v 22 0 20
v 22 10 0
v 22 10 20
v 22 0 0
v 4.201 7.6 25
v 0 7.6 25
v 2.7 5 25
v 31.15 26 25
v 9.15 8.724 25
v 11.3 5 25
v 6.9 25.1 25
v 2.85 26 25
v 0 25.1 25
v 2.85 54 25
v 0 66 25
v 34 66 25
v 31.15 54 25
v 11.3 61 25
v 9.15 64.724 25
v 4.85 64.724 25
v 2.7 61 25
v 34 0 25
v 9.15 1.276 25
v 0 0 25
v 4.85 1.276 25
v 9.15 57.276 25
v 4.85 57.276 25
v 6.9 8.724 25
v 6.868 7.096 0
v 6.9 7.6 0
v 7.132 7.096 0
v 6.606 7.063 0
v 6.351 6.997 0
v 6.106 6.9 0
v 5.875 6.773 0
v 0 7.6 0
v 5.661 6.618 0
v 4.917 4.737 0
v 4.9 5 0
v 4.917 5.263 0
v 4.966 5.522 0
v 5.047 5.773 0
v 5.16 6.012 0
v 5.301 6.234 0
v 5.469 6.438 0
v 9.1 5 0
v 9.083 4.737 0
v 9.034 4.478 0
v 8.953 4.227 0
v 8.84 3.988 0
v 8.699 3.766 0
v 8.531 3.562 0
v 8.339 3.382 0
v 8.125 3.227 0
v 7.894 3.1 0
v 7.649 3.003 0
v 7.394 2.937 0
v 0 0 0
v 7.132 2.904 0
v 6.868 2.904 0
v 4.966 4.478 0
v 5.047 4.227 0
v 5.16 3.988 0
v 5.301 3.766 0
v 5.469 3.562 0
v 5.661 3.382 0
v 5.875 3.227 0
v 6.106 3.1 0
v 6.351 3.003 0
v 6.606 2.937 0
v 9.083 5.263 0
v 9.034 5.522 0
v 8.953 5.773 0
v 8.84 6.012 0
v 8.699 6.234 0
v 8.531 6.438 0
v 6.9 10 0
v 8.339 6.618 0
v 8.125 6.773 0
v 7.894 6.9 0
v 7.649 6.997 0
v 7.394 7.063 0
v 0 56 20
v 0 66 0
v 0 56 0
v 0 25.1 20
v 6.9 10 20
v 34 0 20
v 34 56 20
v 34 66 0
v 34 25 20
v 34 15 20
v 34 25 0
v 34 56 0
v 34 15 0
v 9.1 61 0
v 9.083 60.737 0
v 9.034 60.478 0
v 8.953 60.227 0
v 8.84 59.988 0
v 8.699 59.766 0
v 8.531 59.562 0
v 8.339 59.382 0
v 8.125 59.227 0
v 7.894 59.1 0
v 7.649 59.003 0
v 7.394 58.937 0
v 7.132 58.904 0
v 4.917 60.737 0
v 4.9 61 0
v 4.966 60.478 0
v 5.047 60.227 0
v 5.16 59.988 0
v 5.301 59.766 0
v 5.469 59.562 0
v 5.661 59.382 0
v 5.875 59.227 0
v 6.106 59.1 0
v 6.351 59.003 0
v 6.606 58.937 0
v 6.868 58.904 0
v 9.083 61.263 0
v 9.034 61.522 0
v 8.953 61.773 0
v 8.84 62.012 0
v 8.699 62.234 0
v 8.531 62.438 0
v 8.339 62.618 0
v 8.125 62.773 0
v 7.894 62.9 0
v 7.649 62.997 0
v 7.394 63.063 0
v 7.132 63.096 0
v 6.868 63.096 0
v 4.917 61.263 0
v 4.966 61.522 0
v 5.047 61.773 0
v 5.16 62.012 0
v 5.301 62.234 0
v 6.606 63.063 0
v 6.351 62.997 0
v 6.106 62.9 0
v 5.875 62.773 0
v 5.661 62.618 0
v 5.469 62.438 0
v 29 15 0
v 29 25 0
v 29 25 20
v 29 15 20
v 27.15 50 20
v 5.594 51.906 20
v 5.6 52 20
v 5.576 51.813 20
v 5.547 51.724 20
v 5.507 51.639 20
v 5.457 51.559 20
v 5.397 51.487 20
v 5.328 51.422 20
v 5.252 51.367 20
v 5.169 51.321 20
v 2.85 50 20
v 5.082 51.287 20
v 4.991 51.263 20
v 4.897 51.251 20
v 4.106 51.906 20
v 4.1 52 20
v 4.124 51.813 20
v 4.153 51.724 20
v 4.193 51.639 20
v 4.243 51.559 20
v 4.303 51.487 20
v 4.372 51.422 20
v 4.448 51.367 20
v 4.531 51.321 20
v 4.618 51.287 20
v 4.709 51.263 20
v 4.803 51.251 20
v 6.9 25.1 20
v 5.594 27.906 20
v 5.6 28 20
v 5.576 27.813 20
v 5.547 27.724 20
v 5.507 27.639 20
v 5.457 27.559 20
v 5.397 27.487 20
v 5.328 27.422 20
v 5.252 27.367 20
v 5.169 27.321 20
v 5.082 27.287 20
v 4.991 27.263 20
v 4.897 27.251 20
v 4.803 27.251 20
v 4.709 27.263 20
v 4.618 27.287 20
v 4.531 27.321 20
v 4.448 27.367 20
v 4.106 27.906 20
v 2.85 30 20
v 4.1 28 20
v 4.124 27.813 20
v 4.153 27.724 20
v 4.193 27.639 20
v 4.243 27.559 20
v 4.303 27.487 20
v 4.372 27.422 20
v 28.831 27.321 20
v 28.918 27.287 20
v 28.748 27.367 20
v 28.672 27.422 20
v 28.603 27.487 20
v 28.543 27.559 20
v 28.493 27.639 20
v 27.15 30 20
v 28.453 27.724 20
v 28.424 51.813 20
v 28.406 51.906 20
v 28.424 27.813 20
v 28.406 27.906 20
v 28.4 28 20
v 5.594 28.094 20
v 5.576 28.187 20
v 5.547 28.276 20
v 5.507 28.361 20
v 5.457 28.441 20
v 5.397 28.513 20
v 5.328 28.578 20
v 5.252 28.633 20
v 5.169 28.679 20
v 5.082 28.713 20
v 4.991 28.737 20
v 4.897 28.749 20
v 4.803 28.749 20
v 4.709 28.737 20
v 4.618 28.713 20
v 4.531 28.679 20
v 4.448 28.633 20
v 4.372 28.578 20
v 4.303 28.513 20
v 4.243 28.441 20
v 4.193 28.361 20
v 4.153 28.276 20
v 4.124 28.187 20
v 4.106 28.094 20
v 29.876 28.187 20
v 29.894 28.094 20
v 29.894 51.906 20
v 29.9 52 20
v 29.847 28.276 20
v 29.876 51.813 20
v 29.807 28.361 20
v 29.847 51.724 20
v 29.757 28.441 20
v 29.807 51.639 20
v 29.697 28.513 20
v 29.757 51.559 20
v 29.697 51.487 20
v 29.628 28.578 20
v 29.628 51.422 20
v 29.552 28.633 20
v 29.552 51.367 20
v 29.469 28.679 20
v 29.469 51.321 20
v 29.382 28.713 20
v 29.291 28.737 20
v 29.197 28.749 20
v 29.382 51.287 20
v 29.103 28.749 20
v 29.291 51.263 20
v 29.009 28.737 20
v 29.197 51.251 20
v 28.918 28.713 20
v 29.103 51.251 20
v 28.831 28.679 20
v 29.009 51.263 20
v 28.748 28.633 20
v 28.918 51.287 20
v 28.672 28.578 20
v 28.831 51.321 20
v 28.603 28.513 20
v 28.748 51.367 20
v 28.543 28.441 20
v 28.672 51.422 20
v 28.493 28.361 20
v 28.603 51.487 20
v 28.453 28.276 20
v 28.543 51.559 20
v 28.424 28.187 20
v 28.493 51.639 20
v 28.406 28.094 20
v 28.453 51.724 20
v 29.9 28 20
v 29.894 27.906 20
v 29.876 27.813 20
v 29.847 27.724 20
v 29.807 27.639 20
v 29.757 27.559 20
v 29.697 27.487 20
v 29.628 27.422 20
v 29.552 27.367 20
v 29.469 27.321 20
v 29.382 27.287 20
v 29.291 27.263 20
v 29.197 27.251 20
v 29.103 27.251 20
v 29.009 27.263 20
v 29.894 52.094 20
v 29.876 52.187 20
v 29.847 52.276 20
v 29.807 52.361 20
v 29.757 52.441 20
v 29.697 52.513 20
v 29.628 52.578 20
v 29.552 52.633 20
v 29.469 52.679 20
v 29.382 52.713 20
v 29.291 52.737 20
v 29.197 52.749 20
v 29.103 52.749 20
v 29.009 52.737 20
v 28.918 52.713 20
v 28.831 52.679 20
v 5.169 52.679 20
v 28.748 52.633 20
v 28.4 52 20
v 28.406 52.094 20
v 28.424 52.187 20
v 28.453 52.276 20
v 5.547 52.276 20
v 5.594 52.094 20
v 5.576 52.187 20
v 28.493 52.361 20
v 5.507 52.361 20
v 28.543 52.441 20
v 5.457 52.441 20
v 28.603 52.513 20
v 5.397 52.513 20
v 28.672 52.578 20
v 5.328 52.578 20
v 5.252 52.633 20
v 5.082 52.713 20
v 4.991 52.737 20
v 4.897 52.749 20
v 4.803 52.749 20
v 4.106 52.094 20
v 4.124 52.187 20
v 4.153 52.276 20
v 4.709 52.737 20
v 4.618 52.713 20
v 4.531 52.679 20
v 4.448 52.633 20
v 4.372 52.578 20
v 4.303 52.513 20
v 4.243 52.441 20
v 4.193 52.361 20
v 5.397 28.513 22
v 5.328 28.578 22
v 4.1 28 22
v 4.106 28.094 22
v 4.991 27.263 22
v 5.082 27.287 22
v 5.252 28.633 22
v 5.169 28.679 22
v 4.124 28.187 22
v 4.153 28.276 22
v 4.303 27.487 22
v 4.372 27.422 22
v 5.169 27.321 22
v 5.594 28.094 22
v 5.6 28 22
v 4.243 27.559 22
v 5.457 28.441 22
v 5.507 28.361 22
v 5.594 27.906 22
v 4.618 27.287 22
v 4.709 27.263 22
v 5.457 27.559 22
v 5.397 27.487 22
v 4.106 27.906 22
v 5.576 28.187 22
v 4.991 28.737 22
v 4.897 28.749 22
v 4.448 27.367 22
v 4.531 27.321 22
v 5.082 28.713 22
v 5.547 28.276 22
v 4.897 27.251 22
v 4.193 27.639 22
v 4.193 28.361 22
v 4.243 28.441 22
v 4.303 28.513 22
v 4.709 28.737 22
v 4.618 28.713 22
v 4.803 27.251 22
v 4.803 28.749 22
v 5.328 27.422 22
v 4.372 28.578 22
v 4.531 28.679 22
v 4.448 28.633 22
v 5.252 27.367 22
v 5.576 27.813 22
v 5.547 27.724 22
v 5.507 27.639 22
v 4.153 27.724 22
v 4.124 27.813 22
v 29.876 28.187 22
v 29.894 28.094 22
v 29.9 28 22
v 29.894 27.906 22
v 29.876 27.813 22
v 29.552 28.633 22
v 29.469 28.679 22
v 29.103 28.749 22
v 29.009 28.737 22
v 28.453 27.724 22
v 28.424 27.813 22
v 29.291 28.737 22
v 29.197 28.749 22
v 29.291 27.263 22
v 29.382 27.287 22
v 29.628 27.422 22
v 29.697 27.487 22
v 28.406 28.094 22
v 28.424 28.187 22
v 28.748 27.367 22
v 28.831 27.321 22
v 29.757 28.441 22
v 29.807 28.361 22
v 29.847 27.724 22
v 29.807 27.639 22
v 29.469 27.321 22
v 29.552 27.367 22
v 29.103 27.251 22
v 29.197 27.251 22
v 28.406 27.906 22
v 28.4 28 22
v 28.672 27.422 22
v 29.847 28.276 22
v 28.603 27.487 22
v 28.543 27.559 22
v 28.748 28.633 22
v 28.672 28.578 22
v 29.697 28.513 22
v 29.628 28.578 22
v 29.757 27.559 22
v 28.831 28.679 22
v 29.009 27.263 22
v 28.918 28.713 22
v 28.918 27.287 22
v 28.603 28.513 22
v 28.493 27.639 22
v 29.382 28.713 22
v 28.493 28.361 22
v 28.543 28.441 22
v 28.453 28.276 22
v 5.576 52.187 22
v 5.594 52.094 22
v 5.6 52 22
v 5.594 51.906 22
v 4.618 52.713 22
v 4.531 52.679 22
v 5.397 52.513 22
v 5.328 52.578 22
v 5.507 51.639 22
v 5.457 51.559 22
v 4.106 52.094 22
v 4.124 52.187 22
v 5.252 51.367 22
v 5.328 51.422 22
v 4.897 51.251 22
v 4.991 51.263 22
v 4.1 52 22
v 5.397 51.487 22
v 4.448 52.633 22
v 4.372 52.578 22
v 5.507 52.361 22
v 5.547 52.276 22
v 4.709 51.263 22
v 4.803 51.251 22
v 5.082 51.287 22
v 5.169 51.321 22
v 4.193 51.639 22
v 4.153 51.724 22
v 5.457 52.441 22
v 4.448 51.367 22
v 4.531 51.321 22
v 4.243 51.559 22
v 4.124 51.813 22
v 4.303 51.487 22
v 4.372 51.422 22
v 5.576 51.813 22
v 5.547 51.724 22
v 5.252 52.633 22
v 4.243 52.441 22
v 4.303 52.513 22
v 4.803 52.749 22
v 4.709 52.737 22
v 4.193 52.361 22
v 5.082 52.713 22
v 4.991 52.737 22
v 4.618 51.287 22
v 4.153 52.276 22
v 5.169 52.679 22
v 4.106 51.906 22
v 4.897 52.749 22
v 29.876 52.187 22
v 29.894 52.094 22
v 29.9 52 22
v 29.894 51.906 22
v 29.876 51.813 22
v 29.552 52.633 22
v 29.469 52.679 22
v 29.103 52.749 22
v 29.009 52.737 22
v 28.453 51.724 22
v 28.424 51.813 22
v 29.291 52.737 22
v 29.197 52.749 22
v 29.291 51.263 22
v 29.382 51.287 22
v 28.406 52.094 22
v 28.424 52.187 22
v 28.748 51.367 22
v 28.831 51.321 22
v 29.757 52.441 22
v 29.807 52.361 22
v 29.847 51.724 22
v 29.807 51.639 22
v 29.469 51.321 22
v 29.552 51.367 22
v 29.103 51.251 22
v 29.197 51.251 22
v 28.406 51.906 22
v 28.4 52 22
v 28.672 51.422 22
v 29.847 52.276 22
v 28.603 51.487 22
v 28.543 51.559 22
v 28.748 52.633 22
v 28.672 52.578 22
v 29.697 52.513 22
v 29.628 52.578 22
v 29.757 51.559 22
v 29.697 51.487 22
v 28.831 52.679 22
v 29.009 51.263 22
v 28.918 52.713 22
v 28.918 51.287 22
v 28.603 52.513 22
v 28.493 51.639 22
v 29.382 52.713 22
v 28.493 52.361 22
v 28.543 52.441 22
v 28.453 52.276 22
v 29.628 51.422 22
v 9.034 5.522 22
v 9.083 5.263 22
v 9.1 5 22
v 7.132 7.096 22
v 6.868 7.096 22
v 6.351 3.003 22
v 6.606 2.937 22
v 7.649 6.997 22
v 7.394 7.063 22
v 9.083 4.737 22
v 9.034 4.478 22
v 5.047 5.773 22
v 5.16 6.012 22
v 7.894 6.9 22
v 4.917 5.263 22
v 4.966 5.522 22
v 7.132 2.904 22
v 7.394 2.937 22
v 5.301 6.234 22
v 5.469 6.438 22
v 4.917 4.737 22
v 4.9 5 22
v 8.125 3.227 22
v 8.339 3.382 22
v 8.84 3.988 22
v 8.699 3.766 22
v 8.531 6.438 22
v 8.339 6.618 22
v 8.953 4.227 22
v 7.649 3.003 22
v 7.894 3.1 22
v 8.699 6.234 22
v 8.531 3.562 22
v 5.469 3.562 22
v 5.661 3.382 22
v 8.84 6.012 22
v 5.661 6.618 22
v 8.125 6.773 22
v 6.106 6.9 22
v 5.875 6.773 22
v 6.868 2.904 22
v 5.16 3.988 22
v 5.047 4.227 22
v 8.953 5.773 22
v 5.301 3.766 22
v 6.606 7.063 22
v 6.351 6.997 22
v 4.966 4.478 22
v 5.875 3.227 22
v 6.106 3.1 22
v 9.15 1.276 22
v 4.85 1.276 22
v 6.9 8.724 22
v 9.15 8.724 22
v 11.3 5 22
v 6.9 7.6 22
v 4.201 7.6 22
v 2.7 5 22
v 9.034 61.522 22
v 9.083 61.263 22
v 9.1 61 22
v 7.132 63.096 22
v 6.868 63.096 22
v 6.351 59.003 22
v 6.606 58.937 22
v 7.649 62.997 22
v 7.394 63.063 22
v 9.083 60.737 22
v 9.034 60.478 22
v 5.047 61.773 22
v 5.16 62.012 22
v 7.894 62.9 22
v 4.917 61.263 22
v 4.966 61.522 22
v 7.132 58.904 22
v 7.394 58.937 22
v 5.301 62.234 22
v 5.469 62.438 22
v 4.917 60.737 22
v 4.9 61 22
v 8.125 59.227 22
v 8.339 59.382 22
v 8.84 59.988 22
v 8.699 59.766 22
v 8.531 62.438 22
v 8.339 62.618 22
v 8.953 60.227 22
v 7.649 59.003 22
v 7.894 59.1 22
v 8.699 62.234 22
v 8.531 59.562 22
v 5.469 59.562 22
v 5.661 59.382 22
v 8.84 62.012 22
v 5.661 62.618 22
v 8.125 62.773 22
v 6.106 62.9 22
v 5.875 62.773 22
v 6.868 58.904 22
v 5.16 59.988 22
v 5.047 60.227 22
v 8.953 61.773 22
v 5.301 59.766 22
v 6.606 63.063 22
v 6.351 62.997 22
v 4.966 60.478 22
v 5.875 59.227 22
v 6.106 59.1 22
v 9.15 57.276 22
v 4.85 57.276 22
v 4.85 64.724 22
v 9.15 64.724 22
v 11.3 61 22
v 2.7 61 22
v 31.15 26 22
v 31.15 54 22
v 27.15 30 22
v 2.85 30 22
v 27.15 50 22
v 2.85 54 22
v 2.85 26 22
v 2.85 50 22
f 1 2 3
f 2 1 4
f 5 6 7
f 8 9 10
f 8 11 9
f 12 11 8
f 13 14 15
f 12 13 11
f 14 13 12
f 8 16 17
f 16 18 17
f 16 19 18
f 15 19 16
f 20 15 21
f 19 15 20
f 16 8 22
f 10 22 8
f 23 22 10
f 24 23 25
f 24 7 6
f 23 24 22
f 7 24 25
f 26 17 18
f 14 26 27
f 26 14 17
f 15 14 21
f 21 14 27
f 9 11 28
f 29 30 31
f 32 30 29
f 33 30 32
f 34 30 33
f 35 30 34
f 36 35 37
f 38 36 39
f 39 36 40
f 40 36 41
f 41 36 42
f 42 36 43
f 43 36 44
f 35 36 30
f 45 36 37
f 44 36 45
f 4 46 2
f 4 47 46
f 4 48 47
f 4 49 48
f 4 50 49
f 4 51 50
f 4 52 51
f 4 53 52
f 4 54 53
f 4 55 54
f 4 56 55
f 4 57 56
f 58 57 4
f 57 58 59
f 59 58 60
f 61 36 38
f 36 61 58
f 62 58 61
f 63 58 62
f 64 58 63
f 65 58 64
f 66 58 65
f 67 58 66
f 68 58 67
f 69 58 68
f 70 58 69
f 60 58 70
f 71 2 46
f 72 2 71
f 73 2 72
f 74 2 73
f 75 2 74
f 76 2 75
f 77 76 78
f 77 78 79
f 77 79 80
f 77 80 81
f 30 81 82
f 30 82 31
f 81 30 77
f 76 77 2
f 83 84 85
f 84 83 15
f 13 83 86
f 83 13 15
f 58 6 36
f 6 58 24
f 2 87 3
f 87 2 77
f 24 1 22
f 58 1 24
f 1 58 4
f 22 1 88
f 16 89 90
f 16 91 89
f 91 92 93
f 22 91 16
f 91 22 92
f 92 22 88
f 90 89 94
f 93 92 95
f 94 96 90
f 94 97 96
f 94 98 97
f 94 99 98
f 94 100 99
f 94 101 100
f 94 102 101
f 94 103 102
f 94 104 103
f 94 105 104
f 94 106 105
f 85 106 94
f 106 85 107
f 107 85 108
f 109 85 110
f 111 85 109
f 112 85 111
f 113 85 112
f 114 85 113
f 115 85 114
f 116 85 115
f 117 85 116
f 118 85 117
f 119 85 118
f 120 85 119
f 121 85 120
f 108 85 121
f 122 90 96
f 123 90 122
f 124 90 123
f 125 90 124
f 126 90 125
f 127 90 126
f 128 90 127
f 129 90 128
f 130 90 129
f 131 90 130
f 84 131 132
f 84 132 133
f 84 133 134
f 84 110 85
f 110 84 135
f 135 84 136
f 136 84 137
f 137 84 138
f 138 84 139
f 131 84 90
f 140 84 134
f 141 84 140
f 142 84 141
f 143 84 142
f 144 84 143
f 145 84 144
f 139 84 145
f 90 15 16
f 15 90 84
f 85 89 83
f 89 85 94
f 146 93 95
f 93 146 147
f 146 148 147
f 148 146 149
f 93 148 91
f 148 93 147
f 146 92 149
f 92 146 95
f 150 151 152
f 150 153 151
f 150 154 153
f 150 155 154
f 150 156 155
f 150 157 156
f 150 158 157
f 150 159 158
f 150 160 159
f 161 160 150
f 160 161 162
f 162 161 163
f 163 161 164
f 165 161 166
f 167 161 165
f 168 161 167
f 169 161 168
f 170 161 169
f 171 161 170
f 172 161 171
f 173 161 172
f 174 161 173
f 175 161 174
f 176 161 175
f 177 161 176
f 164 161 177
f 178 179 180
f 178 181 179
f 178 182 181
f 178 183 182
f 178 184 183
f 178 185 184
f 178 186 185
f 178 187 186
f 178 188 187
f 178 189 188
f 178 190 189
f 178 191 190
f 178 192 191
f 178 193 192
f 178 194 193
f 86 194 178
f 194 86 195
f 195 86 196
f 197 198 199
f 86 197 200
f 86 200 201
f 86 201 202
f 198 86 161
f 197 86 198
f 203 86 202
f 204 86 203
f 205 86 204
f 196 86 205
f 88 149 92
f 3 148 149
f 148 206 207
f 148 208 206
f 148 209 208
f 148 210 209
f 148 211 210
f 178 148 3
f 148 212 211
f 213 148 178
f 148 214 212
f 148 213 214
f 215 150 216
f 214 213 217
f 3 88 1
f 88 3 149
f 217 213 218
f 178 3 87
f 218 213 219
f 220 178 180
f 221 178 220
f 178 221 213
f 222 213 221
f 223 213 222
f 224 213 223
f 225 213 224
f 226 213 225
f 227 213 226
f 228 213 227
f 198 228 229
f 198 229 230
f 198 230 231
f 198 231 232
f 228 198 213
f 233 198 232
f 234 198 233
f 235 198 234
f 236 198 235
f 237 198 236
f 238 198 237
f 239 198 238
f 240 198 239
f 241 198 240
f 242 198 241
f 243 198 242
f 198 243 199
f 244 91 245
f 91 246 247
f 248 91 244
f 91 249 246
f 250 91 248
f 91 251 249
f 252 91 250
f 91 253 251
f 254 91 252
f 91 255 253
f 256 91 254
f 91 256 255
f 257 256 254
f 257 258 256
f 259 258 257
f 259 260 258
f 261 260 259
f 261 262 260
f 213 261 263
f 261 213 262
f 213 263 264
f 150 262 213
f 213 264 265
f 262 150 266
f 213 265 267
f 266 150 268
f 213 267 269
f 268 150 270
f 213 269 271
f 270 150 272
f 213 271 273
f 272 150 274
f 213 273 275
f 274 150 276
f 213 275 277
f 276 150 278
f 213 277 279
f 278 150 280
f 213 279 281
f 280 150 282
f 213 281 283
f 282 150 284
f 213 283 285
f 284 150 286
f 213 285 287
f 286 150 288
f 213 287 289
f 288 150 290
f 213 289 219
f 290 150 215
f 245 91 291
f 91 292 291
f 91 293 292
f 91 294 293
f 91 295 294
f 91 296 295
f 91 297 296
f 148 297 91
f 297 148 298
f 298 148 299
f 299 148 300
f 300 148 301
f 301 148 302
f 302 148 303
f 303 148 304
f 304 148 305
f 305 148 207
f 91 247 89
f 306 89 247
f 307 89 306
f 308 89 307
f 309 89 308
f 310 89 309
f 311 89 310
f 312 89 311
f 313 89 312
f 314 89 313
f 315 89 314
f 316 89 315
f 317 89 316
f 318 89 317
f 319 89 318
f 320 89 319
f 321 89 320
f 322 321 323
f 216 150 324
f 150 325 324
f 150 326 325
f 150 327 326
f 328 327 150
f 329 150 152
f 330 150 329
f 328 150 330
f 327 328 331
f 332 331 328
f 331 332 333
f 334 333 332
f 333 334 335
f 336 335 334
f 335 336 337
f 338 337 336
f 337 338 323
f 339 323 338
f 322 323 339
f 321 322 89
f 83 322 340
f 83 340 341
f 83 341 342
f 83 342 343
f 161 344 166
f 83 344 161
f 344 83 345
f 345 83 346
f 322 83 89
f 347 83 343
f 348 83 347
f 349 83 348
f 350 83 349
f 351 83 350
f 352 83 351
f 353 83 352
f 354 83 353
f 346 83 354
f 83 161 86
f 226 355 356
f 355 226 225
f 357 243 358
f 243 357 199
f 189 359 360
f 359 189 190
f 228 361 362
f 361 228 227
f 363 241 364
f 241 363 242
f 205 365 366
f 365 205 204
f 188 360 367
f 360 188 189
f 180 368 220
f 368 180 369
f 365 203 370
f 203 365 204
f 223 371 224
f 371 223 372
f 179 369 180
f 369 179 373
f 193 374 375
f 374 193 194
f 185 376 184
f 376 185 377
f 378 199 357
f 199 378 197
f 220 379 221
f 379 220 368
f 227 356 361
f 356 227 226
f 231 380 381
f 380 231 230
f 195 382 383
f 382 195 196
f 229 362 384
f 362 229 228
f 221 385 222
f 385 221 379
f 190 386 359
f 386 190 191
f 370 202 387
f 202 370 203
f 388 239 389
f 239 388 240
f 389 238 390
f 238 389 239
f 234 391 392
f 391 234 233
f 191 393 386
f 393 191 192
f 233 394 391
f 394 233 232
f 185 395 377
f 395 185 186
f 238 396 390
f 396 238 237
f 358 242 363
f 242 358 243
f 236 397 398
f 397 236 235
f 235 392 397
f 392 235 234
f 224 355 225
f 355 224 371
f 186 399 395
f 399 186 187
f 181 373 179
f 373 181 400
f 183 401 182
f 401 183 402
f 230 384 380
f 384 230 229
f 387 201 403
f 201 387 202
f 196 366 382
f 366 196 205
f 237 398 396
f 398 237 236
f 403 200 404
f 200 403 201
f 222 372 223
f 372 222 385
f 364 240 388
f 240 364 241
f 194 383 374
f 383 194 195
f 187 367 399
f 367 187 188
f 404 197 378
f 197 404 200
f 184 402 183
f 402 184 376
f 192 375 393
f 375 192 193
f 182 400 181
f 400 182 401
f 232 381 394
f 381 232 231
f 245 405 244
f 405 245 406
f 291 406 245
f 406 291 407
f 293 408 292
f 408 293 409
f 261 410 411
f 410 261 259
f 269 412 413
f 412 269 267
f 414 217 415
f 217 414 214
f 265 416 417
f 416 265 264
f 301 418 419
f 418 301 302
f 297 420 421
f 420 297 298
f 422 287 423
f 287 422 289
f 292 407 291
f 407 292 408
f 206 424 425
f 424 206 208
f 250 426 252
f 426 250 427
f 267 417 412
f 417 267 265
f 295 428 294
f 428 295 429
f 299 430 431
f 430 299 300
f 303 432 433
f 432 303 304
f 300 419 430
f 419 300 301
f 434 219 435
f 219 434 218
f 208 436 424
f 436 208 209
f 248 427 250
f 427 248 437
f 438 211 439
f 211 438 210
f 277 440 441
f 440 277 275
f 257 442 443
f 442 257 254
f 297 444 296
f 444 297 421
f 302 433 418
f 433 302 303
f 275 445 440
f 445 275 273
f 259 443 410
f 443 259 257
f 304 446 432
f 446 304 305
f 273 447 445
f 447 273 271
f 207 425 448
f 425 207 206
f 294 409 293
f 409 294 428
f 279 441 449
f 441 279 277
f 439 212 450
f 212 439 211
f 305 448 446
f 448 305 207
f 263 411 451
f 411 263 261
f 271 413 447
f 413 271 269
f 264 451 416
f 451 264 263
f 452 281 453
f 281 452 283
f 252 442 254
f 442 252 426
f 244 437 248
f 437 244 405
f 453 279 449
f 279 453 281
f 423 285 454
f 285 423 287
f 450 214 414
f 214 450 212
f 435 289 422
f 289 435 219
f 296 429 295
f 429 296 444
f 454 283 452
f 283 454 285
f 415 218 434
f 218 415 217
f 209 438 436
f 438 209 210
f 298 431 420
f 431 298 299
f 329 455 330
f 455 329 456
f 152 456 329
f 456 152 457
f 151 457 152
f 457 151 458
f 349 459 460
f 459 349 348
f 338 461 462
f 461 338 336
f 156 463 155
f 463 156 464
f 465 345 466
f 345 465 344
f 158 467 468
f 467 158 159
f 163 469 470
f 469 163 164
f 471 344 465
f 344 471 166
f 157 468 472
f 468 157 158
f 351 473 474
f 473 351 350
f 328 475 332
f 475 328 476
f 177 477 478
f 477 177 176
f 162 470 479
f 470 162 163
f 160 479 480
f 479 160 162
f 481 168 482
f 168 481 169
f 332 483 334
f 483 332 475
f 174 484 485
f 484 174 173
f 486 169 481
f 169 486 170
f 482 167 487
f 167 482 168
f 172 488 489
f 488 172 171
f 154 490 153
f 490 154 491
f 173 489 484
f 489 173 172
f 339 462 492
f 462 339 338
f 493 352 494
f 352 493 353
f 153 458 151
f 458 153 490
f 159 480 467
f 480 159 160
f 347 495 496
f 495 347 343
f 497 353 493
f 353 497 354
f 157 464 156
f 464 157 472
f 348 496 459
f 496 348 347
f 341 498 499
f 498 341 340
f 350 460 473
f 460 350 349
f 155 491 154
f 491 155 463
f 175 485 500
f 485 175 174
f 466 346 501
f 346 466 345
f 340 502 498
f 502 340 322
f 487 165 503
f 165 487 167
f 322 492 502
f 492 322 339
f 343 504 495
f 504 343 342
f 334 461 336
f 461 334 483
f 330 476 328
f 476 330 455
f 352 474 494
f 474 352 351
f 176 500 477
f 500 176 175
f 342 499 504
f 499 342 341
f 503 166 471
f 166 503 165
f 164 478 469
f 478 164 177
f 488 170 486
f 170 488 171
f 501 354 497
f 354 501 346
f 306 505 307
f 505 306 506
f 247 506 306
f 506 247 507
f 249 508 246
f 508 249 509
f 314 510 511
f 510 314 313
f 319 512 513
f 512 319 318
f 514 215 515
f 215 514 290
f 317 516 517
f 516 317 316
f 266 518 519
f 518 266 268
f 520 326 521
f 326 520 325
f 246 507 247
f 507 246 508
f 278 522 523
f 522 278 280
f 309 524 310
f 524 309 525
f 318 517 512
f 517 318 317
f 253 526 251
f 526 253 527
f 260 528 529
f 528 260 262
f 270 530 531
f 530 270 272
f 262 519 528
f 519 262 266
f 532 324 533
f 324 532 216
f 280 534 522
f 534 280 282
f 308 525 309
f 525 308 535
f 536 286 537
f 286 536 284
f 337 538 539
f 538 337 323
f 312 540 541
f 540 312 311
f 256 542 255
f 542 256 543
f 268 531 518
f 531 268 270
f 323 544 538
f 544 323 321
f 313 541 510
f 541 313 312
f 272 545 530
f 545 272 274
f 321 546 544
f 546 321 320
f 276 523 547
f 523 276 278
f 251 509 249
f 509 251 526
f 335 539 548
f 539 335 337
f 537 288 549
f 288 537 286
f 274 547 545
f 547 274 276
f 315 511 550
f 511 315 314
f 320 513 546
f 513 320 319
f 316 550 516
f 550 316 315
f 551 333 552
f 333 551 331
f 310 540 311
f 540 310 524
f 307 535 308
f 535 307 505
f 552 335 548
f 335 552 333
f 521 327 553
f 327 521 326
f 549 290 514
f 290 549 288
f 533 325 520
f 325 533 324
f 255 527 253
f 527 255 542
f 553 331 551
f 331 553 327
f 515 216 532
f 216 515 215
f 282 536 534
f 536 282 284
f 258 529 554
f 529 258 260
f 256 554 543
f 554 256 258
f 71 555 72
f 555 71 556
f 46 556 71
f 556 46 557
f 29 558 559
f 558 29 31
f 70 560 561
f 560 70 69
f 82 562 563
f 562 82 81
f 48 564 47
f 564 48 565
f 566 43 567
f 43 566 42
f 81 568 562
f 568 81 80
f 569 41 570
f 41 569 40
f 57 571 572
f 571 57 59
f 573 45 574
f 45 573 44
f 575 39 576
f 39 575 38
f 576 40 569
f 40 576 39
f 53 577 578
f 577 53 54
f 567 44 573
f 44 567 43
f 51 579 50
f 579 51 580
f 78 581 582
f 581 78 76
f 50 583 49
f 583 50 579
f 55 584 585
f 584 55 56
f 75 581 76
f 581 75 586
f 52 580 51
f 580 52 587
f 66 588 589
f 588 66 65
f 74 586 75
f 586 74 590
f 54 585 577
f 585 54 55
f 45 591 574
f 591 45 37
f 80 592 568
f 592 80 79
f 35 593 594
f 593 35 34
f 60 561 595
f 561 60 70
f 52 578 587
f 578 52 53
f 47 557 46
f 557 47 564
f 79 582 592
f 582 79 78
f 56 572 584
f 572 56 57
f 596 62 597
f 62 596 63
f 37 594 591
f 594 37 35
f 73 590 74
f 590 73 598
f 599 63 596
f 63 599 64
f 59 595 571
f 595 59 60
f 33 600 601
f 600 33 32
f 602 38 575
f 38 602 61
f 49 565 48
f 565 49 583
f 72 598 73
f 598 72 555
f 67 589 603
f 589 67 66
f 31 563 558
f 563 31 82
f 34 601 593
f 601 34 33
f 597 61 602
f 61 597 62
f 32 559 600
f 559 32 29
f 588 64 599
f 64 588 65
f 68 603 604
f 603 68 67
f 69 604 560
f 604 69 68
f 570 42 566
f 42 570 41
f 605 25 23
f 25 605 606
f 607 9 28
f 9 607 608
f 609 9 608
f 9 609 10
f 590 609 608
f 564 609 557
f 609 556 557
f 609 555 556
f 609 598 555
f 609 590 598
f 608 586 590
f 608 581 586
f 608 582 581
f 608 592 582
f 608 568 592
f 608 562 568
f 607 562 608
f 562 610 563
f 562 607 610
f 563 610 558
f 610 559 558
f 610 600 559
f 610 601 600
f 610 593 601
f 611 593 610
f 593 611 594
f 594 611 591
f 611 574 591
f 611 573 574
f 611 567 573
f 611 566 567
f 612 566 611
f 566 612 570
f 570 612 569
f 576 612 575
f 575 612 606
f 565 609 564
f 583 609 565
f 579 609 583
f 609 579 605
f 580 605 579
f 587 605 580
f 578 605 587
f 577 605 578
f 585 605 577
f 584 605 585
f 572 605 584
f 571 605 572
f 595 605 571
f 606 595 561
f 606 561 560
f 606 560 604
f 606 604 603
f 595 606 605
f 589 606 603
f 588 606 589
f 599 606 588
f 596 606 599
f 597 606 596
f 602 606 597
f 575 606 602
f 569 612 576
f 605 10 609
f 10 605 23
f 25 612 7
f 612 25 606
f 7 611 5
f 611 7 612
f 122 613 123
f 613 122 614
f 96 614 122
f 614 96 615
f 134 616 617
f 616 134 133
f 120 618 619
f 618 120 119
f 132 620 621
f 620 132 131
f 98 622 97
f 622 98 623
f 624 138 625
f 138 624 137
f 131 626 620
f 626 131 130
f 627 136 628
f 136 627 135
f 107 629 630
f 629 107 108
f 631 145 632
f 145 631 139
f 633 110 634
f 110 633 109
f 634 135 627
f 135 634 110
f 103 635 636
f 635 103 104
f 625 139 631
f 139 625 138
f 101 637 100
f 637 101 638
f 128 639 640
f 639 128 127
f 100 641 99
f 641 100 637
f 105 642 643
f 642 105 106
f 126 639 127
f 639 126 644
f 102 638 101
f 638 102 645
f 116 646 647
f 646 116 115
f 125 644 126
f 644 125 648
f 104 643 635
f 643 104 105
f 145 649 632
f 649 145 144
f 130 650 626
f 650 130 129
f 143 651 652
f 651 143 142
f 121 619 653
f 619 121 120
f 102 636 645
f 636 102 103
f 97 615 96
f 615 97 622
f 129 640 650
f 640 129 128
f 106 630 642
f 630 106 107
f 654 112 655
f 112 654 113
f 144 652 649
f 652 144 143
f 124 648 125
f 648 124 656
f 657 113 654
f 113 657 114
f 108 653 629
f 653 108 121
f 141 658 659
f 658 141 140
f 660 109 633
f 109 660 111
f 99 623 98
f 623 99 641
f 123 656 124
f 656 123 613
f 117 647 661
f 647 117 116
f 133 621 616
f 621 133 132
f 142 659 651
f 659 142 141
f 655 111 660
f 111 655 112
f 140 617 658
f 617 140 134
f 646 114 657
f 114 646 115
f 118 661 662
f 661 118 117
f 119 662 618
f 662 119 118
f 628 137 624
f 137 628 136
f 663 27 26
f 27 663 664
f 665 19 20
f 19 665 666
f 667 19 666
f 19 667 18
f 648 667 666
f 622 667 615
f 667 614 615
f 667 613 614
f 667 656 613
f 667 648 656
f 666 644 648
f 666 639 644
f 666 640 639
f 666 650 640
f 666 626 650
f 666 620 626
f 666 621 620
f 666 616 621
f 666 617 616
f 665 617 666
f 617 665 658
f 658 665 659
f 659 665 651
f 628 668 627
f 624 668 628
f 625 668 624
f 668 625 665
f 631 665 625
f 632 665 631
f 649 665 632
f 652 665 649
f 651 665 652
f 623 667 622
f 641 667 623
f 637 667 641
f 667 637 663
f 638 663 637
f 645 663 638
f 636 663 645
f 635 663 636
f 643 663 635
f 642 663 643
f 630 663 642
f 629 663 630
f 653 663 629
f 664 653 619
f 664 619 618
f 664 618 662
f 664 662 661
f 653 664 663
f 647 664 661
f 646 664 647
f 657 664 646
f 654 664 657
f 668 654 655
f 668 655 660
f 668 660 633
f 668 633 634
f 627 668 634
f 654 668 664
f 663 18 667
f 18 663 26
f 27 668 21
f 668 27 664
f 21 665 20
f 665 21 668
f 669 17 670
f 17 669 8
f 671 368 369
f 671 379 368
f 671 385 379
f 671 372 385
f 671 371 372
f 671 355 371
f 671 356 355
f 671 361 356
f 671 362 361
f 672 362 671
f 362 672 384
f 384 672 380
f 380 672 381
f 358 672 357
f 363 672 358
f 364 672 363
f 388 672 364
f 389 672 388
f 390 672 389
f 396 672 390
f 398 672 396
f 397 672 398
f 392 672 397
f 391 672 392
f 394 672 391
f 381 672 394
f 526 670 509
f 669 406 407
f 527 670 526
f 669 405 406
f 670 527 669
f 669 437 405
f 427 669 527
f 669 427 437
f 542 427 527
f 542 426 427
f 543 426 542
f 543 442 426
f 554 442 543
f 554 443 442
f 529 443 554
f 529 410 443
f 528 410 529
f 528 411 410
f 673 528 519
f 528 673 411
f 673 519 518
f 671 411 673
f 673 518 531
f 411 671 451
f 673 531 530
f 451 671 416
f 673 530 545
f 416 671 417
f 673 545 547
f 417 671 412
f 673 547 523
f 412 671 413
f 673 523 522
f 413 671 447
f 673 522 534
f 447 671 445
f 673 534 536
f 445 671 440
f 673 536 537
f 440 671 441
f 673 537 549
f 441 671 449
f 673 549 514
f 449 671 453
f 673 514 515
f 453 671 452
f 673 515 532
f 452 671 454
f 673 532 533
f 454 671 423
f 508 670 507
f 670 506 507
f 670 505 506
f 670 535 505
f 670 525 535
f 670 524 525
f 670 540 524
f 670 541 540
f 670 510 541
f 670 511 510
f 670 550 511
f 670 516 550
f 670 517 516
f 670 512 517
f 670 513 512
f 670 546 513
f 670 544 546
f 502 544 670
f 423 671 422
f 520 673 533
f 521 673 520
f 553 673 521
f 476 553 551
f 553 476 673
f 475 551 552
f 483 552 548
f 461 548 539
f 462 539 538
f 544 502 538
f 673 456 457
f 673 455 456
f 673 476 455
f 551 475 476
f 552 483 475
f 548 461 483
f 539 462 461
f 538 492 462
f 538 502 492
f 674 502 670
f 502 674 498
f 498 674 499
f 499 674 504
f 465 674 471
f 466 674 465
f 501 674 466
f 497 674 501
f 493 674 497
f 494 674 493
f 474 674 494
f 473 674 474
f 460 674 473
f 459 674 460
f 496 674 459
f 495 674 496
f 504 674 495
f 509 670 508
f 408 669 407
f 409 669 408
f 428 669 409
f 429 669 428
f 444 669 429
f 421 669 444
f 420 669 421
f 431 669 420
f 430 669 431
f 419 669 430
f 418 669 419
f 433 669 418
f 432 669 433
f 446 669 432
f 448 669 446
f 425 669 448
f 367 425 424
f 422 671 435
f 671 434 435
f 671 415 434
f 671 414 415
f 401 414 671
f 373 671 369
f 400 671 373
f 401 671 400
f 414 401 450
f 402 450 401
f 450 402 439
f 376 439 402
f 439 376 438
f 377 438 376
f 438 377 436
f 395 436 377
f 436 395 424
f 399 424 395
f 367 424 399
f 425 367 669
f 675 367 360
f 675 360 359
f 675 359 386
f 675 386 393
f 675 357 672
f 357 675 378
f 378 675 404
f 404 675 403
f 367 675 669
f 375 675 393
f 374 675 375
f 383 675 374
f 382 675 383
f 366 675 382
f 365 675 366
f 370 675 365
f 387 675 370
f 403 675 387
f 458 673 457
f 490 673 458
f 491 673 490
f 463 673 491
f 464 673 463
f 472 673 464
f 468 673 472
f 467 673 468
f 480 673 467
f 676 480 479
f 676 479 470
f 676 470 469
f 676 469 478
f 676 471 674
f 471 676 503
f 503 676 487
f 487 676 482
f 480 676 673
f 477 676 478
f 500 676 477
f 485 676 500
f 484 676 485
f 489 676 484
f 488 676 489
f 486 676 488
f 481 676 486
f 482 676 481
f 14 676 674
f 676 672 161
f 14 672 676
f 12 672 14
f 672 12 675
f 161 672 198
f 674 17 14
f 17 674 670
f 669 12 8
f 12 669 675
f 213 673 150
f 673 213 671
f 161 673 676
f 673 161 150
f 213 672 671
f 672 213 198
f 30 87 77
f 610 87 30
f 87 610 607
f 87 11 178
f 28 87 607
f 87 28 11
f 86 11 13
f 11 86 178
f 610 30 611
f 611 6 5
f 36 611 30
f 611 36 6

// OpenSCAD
// ============================================
// FICHIER : support_ssd1306.scad
// DESCRIPTION : Support pour écran OLED SSD1306 avec fixation.
//               Comprend des jambes de support, un plateau,
//               des emplacements pour écrous et des trous de fixation.
// ============================================

// ----------------------------
// 1. DIMENSIONS DES TROUS DE FIXATION
// ----------------------------
// Diamètre des trous (en mm)
trou_dia = 4.2;
// Distance entre les jambes (en mm)
trou_dis = 56;

// ----------------------------
// 2. DIMENSIONS DES ÉCROUS
// ----------------------------
// Diamètre de l'écrou (pour vis de 7mm, en mm)
ecrou_d = 8.6;
// Épaisseur de l'écrou (en mm)
ecrou_e = 3;

// ----------------------------
// 3. DIMENSIONS DE LA BASE
// ----------------------------
// Longueur de la base (en mm)
base_l = 10;
// Longueur horizontale de la jambe gauche (en mm)
base_Lh = 7;
// Longueur de la jambe droite depuis la base (en mm)
base_D_Lb = 27;
// Longueur de la jambe gauche depuis la base (en mm)
base_G_Lb = 15;

// ----------------------------
// 4. DIMENSIONS GÉNÉRALES
// ----------------------------
// Hauteur totale du support (en mm)
h = 25;

// Épaisseur du plateau supérieur (en mm)
dessus_e = 5;

// ----------------------------
// 5. DIMENSIONS DE L'ÉCRAN SSD1306
// ----------------------------
// Largeur de l'écran (en mm)
ecran_l = 28;
// Hauteur de l'écran (en mm)
ecran_h = 28.3;
// Épaisseur de l'écran (en mm)
ecran_e = 3;
// Marge autour de l'écran pour l logarithm (en mm)
ecran_s = 4;

// ----------------------------
// 6. DIMENSIONS DES VIS
// ----------------------------
// Diamètre des vis de fixation de l'écran (en mm)
vis_d = 1.5;

// ----------------------------
// 7. QUALITÉ DE RENDU
// ----------------------------
$fn = 50;


// ============================================
// CONSTRUCTION PRINCIPALE
// ============================================

difference() {
  // ----------------------------
  // Structure de base : jambes + plateau
  // ----------------------------
  union() {
    // Jambe Gauche : support vertical
    cube([base_Lh + base_G_Lb, base_l, h]);
    
    // Jambe Droite : support vertical (décalé)
    translate([0, trou_dis, 0]) 
      cube([base_Lh + base_D_Lb, base_l, h]);
    
    // Jambe Milieu : renfort central
    translate([base_Lh + base_D_Lb - base_l/2, base_l*1.5, 0]) 
      cube([base_l/2, base_l, h]);
    
    // Plateau supérieur : surface de support pour l'écran
    translate([0, 0, h - dessus_e]) 
      cube([base_Lh + base_D_Lb, base_l + trou_dis, dessus_e]);
  }
  
  // ----------------------------
  // Évidements : passage de vis et écrous (Droite)
  // ----------------------------
  // Passage de vis (jambe droite)
  translate([base_Lh, base_l/2, -0.1]) 
    cylinder(d = trou_dia, h = h + 5);
  
  // Emplacement pour écrou (jambe droite)
  translate([base_Lh, base_l/2, h - ecrou_e]) 
    cylinder(d = ecrou_d, h = h, $fn = 6);
  
  // ----------------------------
  // Évidements : passage de vis et écrous (Gauche)
  // ----------------------------
  // Passage de vis (jambe gauche)
  translate([0, trou_dis, 0]) 
    translate([base_Lh, base_l/2, -0.1]) 
      cylinder(d = trou_dia, h = h + 5);
  
  // Emplacement pour écrou (jambe gauche)
  translate([0, trou_dis, 0]) 
    translate([base_Lh, base_l/2, h - ecrou_e]) 
      cylinder(d = ecrou_d, h = h, $fn = 6);
  
  // ----------------------------
  // Évidement : emplacement de l'écran
  // ----------------------------
  // Emplacement pour l'écran SSD1306
  translate([(base_Lh + base_D_Lb - ecran_h)/2, (base_l + trou_dis - ecran_l)/2 + 7, h - ecran_e]) 
    cube([ecran_h, ecran_l, ecran_e * 2]);
  
  // Évidement sous l'écran (pour câbles ou composants)
  translate([(base_Lh + base_D_Lb - ecran_h)/2, (base_l + trou_dis - ecran_l)/2 + 7 + ecran_s]) 
    cube([ecran_h - ecran_s, ecran_l - 2*ecran_s, h * 2]);
  
  // ----------------------------
  // Trous de fixation pour l'écran
  // ----------------------------
  // 4 trous aux coins de l'écran pour fixation
  translate([(base_Lh + base_D_Lb - ecran_h)/2 + 2, (base_l + trou_dis - ecran_l)/2 + 7 + 2, 0]) 
    union() {
      // Trou 1 (coin supérieur gauche de l'écran)
      cylinder(d = vis_d, h = 2*h);
      
      // Trou 2 (coin supérieur droit de l'écran)
      translate([ecran_h - 4, 0, 0]) 
        cylinder(d = vis_d, h = 2*h);
      
      // Trou 3 (coin inférieur gauche de l'écran)
      translate([0, ecran_l - 4, 0]) 
        cylinder(d = vis_d, h = 2*h);
      
      // Trou 4 (coin inférieur droit de l'écran)
      translate([ecran_h - 4, ecran_l - 4, 0]) 
        cylinder(d = vis_d, h = 2*h);
    }
  
  // ----------------------------
  // Évidement : accès au connecteur de la sonde thermique
  // ----------------------------
  // Ouverture pour accéder au connecteur de la sonde de température
  translate([base_Lh - trou_dia/2 + 2 - 9, base_l/2 + trou_dia/2 + 0.5, -1]) 
    cube([9, 17.5, 2*h]);
  
  // ----------------------------
  // CODE COMMENTÉ (tests d'impression)
  // ----------------------------
  // Test impression gabarit
  // translate([-1,-1,-dessus_e-0.1])cube([trou_dis*2,trou_dis*2,h]);
  // translate([-1,-1,h-dessus_e+0.1])cube([trou_dis*2,trou_dis*2,h]);
  
  // Test impression réservation écrou
  // translate([-1,-1,-dessus_e])cube([trou_dis*2,trou_dis*2,h]);
  // translate([13,-1,0])cube([trou_dis*2,trou_dis*2,2*h]);
  // translate([-1,11,0])cube([trou_dis*2,trou_dis*2,2*h]);
}
